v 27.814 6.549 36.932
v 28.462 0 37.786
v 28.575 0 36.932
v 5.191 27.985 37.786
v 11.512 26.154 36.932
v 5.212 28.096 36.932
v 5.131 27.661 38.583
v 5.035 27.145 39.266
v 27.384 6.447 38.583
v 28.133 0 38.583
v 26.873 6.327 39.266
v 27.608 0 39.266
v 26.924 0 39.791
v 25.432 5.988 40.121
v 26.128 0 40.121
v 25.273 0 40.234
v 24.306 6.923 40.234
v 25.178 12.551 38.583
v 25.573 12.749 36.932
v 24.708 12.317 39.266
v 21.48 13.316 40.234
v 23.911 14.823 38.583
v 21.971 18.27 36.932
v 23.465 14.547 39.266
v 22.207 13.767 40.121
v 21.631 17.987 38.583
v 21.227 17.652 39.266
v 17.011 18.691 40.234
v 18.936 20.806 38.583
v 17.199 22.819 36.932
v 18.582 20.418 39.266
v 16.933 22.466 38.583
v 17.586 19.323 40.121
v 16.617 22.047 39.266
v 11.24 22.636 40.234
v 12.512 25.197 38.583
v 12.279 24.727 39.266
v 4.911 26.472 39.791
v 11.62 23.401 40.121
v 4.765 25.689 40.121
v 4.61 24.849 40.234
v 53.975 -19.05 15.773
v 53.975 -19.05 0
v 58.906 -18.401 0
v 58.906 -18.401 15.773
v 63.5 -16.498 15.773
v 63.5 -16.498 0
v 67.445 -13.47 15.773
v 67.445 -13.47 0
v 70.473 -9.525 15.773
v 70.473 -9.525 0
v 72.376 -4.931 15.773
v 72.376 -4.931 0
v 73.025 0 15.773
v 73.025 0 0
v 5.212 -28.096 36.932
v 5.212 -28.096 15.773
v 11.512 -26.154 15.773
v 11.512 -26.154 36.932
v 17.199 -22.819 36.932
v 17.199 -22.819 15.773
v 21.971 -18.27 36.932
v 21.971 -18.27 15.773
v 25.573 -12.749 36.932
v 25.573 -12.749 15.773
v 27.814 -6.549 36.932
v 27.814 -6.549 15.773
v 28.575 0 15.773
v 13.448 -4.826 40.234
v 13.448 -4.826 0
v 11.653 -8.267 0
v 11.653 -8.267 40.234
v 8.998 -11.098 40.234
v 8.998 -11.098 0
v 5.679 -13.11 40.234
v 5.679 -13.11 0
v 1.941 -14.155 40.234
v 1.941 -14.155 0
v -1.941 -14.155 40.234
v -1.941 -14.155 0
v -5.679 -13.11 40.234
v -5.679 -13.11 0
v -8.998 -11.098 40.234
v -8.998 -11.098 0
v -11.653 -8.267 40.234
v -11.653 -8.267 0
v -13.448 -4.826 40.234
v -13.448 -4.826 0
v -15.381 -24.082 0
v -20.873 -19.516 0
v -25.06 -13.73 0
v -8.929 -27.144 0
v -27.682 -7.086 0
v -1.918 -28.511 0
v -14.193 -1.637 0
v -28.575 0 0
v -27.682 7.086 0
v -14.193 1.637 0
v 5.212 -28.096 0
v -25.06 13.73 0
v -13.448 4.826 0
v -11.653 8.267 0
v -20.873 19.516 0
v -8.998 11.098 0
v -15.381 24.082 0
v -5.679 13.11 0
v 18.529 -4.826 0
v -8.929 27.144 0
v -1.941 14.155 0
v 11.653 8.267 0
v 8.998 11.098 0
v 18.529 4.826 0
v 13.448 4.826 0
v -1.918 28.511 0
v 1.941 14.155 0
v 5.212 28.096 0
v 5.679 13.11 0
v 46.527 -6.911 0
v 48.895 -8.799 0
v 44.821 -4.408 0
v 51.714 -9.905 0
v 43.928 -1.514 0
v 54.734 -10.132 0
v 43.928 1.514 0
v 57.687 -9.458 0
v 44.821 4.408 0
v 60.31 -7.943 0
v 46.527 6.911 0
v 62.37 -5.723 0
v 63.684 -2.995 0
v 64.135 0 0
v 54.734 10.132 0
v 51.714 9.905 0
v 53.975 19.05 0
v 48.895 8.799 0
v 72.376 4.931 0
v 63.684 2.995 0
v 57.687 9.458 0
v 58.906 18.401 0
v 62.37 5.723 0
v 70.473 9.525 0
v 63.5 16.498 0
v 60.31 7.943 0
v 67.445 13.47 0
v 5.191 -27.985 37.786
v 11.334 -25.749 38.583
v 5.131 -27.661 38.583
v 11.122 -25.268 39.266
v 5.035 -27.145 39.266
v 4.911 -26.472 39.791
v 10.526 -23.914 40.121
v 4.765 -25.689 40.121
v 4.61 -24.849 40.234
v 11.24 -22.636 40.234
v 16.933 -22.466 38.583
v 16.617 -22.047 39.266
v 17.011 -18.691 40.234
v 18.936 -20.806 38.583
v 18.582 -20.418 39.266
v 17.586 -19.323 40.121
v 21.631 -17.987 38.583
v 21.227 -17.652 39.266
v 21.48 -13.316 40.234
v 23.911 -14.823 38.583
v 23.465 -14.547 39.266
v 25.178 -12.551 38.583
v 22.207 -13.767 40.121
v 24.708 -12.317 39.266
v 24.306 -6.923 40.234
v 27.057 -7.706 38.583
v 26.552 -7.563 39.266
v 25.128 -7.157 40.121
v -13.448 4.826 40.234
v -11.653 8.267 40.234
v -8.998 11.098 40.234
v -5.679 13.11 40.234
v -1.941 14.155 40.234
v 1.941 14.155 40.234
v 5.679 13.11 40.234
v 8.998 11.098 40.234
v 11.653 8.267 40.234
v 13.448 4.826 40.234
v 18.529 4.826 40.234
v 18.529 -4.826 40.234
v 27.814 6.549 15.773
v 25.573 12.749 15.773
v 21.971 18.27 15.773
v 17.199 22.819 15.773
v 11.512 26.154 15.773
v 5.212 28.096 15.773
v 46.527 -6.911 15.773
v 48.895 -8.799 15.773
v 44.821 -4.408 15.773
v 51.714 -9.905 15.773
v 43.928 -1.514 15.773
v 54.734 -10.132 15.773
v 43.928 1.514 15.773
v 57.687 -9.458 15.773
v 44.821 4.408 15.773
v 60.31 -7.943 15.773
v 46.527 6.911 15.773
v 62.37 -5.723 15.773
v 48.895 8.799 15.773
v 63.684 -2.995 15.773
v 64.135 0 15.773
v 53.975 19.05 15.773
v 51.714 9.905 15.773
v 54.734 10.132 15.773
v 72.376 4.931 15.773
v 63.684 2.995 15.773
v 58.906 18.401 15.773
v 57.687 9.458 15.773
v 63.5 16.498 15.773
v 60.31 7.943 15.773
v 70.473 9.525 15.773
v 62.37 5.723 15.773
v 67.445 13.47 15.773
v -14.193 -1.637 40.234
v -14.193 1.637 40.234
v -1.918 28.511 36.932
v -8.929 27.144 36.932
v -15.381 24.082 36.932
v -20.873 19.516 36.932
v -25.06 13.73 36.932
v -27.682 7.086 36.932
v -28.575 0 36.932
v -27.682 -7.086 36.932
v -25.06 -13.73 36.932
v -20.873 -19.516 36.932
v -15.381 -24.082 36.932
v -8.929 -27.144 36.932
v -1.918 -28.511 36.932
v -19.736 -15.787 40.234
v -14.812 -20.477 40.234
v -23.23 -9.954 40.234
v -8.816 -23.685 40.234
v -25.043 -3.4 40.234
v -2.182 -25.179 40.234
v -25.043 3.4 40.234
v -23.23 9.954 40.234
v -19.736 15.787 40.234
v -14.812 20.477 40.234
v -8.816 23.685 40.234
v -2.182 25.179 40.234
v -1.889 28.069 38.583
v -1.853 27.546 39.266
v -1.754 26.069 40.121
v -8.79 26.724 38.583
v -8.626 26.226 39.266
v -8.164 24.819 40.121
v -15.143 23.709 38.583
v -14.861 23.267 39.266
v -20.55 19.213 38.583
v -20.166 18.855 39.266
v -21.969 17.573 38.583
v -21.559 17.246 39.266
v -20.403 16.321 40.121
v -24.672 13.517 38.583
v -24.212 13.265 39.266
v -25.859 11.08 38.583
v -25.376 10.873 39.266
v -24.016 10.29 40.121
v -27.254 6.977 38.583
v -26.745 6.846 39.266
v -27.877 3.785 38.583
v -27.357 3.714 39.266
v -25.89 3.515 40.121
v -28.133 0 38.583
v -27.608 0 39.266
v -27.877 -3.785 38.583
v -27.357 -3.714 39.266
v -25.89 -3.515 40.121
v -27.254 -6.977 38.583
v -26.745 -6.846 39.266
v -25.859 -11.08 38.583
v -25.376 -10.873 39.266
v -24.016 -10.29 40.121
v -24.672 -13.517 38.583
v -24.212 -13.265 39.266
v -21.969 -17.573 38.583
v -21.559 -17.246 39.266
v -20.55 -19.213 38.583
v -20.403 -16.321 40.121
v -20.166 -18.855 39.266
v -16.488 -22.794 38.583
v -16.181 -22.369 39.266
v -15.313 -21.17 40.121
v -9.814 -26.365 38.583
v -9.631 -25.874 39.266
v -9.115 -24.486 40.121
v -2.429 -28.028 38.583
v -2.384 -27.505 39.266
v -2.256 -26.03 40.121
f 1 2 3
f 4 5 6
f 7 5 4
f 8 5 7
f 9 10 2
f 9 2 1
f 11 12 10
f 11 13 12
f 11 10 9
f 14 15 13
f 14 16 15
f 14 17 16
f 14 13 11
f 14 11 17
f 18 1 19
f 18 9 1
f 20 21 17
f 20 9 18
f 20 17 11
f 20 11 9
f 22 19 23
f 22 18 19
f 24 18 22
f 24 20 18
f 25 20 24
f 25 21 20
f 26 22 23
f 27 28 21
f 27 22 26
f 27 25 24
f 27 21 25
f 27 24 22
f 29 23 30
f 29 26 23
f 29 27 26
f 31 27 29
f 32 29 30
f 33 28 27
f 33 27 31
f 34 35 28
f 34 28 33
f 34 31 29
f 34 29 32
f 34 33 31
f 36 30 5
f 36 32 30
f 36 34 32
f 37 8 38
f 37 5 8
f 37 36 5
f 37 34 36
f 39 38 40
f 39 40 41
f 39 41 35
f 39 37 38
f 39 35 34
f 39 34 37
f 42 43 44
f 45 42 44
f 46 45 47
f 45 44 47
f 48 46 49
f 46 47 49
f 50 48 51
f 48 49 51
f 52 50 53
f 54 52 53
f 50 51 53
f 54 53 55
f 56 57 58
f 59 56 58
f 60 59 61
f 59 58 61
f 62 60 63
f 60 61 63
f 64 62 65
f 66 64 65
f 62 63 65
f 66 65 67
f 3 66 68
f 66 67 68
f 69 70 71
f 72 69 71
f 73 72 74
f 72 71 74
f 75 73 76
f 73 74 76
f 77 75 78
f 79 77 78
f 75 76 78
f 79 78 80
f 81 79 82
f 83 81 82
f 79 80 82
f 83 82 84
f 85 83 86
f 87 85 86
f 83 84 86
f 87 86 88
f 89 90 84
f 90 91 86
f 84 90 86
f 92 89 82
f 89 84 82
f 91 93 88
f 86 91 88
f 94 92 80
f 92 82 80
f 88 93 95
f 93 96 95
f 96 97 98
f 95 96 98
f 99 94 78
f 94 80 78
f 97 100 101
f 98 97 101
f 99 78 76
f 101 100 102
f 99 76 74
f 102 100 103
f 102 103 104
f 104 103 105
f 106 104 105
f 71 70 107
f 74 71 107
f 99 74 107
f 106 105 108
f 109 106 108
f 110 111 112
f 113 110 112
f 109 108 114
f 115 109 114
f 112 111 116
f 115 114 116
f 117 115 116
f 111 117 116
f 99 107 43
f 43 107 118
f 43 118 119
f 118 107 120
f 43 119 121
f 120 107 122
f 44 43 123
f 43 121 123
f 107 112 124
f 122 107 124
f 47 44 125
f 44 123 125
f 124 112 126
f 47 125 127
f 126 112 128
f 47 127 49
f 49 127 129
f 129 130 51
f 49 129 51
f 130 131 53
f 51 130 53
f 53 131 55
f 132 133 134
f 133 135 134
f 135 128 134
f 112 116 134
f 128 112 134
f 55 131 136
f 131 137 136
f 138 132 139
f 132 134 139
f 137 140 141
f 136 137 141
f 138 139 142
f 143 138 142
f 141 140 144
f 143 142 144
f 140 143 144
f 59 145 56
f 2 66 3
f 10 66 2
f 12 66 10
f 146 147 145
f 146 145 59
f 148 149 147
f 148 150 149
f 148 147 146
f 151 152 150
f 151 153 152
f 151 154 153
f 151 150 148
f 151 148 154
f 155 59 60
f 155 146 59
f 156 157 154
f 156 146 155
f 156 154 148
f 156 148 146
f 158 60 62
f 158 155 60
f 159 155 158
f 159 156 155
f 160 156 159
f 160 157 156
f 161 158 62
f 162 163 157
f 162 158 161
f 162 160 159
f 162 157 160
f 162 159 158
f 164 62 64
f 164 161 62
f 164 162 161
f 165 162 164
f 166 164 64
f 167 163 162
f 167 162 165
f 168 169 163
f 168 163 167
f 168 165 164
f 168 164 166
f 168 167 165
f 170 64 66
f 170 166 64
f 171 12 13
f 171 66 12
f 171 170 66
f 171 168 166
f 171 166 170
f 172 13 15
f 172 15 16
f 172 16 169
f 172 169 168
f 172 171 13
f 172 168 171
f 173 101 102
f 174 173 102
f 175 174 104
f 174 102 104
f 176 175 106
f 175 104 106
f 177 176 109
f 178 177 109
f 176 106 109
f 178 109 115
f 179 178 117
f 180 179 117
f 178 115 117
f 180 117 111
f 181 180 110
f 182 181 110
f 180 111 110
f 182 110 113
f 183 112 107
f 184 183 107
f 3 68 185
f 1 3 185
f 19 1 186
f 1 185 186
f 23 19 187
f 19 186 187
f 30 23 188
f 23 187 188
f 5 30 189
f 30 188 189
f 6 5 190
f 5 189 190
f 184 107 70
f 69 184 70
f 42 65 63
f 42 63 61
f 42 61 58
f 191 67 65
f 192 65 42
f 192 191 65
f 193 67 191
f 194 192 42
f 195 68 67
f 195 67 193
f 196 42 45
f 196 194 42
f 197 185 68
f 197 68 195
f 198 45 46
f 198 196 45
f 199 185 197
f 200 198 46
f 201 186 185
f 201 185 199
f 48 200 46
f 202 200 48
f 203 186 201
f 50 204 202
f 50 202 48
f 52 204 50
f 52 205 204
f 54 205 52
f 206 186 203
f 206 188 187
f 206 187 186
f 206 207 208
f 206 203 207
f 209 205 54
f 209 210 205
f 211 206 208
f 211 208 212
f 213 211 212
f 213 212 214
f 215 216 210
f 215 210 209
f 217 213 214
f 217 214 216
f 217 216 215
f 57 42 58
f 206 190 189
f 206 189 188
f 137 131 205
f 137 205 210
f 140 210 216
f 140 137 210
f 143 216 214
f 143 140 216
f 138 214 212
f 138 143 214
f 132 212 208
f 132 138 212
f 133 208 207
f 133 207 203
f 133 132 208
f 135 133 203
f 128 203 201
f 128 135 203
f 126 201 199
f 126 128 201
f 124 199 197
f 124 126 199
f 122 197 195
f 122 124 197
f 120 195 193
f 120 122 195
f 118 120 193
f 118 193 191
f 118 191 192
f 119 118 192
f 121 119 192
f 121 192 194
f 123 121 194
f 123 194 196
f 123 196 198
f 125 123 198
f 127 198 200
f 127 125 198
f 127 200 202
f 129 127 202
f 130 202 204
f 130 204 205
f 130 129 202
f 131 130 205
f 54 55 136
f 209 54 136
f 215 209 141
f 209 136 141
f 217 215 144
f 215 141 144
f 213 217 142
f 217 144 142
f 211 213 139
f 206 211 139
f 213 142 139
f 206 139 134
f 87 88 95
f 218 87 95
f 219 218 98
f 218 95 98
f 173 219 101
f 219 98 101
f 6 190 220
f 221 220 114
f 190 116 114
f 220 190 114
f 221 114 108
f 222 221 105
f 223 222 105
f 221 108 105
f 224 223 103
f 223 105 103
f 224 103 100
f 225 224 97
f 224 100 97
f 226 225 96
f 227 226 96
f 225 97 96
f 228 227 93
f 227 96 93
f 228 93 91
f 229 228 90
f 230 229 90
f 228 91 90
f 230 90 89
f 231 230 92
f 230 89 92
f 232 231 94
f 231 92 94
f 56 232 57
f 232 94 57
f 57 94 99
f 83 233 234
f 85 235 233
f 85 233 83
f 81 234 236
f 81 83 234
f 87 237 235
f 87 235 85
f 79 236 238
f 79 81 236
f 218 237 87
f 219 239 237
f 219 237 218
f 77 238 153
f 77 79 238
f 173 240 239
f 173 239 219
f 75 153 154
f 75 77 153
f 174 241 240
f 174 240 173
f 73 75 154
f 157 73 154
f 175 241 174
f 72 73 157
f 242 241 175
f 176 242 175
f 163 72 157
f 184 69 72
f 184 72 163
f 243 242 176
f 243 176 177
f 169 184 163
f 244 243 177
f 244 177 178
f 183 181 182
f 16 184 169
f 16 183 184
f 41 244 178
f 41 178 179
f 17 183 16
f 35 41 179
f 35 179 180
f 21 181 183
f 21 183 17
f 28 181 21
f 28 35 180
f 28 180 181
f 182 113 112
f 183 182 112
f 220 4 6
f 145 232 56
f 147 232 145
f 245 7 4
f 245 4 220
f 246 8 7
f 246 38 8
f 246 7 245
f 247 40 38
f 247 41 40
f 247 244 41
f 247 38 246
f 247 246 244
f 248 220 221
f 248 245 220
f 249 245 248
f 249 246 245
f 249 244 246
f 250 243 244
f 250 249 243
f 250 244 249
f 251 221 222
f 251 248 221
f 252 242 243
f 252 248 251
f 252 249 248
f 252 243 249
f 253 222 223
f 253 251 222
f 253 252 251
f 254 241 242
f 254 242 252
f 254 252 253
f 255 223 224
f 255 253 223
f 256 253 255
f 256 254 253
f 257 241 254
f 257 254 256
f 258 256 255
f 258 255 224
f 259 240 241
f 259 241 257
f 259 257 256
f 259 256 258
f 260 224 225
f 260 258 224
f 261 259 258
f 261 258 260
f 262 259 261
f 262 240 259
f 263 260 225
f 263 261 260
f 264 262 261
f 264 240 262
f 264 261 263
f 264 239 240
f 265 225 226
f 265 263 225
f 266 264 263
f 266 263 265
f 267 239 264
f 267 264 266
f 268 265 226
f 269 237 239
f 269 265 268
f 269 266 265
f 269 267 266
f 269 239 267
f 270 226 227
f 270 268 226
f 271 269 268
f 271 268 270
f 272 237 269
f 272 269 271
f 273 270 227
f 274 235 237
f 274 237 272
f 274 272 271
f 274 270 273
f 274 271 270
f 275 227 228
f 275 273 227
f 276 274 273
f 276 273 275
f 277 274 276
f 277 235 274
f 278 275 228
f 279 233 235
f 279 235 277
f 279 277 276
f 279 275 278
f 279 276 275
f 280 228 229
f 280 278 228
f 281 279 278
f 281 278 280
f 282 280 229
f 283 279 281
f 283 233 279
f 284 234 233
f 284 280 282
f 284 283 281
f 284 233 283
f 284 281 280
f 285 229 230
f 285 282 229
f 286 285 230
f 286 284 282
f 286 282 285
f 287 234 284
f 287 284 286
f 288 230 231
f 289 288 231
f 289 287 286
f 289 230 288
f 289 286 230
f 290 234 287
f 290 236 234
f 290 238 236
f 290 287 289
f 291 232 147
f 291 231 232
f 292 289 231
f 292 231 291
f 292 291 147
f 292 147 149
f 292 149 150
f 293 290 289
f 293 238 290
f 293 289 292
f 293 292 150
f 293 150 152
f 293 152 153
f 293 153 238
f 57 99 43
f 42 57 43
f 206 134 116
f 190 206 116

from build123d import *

# Parameters (mm, degrees)
F1_DEPTH = 40.2336
F0_R     = 10.16
F2_DEPTH = 15.7734
F3_R     = 3.302


with BuildPart() as f1:
    # F0 (on Top) → F1 (new body)
    with BuildSketch(Plane.XY):
        with BuildLine():
            ThreePointArc((5.211817, -28.095686), (21.971098, -18.270235), (28.575, 0))
            ThreePointArc((28.575, 0), (21.971098, 18.270235), (5.211817, 28.095686))
            ThreePointArc((5.211817, 28.095686), (-28.575, 0), (5.211817, -28.095686))
        make_face()
        with BuildLine():
            ThreePointArc((-13.447765, 4.826), (0, 14.2875), (13.447765, 4.826))
            Line((13.447765, 4.826), (18.5293, 4.826))
            Line((18.5293, 4.826), (18.5293, -4.826))
            Line((18.5293, -4.826), (13.447765, -4.826))
            ThreePointArc((13.447765, -4.826), (0, -14.2875), (-13.447765, -4.826))
            Line((-13.447765, -4.826), (-18.5293, -4.826))
            Line((-18.5293, -4.826), (-18.5293, 4.826))
            Line((-18.5293, 4.826), (-13.447765, 4.826))
        make_face(mode=Mode.SUBTRACT)
        with BuildLine():
            ThreePointArc((-13.447765, -4.826), (-14.2875, 0), (-13.447765, 4.826))
            Line((-13.447765, 4.826), (-18.5293, 4.826))
            Line((-18.5293, 4.826), (-18.5293, -4.826))
            Line((-18.5293, -4.826), (-13.447765, -4.826))
        make_face()
    extrude(amount=F1_DEPTH)

    # F0 (on Top) → F2 (join)
    with BuildSketch(Plane.XY):
        with BuildLine():
            ThreePointArc((5.211817, 28.095686), (21.971098, 18.270235), (28.575, 0))
            ThreePointArc((28.575, 0), (21.971098, -18.270235), (5.211817, -28.095686))
            Line((5.211817, -28.095686), (53.975, -19.05))
            ThreePointArc((53.975, -19.05), (67.445384, -13.470384), (73.025, 0))
            ThreePointArc((73.025, 0), (67.445384, 13.470384), (53.975, 19.05))
            Line((53.975, 19.05), (5.211817, 28.095686))
        make_face()
        with Locations((53.975, 0)):
            Circle(F0_R, mode=Mode.SUBTRACT)
    extrude(amount=F2_DEPTH)

    # F3
    f3_edges = [f1.edges().sort_by_distance(p)[0] for p in [
        (-5.211817, 28.095686, 40.2336),
    ]]
    fillet(f3_edges, radius=F3_R)


solid = f1.part
